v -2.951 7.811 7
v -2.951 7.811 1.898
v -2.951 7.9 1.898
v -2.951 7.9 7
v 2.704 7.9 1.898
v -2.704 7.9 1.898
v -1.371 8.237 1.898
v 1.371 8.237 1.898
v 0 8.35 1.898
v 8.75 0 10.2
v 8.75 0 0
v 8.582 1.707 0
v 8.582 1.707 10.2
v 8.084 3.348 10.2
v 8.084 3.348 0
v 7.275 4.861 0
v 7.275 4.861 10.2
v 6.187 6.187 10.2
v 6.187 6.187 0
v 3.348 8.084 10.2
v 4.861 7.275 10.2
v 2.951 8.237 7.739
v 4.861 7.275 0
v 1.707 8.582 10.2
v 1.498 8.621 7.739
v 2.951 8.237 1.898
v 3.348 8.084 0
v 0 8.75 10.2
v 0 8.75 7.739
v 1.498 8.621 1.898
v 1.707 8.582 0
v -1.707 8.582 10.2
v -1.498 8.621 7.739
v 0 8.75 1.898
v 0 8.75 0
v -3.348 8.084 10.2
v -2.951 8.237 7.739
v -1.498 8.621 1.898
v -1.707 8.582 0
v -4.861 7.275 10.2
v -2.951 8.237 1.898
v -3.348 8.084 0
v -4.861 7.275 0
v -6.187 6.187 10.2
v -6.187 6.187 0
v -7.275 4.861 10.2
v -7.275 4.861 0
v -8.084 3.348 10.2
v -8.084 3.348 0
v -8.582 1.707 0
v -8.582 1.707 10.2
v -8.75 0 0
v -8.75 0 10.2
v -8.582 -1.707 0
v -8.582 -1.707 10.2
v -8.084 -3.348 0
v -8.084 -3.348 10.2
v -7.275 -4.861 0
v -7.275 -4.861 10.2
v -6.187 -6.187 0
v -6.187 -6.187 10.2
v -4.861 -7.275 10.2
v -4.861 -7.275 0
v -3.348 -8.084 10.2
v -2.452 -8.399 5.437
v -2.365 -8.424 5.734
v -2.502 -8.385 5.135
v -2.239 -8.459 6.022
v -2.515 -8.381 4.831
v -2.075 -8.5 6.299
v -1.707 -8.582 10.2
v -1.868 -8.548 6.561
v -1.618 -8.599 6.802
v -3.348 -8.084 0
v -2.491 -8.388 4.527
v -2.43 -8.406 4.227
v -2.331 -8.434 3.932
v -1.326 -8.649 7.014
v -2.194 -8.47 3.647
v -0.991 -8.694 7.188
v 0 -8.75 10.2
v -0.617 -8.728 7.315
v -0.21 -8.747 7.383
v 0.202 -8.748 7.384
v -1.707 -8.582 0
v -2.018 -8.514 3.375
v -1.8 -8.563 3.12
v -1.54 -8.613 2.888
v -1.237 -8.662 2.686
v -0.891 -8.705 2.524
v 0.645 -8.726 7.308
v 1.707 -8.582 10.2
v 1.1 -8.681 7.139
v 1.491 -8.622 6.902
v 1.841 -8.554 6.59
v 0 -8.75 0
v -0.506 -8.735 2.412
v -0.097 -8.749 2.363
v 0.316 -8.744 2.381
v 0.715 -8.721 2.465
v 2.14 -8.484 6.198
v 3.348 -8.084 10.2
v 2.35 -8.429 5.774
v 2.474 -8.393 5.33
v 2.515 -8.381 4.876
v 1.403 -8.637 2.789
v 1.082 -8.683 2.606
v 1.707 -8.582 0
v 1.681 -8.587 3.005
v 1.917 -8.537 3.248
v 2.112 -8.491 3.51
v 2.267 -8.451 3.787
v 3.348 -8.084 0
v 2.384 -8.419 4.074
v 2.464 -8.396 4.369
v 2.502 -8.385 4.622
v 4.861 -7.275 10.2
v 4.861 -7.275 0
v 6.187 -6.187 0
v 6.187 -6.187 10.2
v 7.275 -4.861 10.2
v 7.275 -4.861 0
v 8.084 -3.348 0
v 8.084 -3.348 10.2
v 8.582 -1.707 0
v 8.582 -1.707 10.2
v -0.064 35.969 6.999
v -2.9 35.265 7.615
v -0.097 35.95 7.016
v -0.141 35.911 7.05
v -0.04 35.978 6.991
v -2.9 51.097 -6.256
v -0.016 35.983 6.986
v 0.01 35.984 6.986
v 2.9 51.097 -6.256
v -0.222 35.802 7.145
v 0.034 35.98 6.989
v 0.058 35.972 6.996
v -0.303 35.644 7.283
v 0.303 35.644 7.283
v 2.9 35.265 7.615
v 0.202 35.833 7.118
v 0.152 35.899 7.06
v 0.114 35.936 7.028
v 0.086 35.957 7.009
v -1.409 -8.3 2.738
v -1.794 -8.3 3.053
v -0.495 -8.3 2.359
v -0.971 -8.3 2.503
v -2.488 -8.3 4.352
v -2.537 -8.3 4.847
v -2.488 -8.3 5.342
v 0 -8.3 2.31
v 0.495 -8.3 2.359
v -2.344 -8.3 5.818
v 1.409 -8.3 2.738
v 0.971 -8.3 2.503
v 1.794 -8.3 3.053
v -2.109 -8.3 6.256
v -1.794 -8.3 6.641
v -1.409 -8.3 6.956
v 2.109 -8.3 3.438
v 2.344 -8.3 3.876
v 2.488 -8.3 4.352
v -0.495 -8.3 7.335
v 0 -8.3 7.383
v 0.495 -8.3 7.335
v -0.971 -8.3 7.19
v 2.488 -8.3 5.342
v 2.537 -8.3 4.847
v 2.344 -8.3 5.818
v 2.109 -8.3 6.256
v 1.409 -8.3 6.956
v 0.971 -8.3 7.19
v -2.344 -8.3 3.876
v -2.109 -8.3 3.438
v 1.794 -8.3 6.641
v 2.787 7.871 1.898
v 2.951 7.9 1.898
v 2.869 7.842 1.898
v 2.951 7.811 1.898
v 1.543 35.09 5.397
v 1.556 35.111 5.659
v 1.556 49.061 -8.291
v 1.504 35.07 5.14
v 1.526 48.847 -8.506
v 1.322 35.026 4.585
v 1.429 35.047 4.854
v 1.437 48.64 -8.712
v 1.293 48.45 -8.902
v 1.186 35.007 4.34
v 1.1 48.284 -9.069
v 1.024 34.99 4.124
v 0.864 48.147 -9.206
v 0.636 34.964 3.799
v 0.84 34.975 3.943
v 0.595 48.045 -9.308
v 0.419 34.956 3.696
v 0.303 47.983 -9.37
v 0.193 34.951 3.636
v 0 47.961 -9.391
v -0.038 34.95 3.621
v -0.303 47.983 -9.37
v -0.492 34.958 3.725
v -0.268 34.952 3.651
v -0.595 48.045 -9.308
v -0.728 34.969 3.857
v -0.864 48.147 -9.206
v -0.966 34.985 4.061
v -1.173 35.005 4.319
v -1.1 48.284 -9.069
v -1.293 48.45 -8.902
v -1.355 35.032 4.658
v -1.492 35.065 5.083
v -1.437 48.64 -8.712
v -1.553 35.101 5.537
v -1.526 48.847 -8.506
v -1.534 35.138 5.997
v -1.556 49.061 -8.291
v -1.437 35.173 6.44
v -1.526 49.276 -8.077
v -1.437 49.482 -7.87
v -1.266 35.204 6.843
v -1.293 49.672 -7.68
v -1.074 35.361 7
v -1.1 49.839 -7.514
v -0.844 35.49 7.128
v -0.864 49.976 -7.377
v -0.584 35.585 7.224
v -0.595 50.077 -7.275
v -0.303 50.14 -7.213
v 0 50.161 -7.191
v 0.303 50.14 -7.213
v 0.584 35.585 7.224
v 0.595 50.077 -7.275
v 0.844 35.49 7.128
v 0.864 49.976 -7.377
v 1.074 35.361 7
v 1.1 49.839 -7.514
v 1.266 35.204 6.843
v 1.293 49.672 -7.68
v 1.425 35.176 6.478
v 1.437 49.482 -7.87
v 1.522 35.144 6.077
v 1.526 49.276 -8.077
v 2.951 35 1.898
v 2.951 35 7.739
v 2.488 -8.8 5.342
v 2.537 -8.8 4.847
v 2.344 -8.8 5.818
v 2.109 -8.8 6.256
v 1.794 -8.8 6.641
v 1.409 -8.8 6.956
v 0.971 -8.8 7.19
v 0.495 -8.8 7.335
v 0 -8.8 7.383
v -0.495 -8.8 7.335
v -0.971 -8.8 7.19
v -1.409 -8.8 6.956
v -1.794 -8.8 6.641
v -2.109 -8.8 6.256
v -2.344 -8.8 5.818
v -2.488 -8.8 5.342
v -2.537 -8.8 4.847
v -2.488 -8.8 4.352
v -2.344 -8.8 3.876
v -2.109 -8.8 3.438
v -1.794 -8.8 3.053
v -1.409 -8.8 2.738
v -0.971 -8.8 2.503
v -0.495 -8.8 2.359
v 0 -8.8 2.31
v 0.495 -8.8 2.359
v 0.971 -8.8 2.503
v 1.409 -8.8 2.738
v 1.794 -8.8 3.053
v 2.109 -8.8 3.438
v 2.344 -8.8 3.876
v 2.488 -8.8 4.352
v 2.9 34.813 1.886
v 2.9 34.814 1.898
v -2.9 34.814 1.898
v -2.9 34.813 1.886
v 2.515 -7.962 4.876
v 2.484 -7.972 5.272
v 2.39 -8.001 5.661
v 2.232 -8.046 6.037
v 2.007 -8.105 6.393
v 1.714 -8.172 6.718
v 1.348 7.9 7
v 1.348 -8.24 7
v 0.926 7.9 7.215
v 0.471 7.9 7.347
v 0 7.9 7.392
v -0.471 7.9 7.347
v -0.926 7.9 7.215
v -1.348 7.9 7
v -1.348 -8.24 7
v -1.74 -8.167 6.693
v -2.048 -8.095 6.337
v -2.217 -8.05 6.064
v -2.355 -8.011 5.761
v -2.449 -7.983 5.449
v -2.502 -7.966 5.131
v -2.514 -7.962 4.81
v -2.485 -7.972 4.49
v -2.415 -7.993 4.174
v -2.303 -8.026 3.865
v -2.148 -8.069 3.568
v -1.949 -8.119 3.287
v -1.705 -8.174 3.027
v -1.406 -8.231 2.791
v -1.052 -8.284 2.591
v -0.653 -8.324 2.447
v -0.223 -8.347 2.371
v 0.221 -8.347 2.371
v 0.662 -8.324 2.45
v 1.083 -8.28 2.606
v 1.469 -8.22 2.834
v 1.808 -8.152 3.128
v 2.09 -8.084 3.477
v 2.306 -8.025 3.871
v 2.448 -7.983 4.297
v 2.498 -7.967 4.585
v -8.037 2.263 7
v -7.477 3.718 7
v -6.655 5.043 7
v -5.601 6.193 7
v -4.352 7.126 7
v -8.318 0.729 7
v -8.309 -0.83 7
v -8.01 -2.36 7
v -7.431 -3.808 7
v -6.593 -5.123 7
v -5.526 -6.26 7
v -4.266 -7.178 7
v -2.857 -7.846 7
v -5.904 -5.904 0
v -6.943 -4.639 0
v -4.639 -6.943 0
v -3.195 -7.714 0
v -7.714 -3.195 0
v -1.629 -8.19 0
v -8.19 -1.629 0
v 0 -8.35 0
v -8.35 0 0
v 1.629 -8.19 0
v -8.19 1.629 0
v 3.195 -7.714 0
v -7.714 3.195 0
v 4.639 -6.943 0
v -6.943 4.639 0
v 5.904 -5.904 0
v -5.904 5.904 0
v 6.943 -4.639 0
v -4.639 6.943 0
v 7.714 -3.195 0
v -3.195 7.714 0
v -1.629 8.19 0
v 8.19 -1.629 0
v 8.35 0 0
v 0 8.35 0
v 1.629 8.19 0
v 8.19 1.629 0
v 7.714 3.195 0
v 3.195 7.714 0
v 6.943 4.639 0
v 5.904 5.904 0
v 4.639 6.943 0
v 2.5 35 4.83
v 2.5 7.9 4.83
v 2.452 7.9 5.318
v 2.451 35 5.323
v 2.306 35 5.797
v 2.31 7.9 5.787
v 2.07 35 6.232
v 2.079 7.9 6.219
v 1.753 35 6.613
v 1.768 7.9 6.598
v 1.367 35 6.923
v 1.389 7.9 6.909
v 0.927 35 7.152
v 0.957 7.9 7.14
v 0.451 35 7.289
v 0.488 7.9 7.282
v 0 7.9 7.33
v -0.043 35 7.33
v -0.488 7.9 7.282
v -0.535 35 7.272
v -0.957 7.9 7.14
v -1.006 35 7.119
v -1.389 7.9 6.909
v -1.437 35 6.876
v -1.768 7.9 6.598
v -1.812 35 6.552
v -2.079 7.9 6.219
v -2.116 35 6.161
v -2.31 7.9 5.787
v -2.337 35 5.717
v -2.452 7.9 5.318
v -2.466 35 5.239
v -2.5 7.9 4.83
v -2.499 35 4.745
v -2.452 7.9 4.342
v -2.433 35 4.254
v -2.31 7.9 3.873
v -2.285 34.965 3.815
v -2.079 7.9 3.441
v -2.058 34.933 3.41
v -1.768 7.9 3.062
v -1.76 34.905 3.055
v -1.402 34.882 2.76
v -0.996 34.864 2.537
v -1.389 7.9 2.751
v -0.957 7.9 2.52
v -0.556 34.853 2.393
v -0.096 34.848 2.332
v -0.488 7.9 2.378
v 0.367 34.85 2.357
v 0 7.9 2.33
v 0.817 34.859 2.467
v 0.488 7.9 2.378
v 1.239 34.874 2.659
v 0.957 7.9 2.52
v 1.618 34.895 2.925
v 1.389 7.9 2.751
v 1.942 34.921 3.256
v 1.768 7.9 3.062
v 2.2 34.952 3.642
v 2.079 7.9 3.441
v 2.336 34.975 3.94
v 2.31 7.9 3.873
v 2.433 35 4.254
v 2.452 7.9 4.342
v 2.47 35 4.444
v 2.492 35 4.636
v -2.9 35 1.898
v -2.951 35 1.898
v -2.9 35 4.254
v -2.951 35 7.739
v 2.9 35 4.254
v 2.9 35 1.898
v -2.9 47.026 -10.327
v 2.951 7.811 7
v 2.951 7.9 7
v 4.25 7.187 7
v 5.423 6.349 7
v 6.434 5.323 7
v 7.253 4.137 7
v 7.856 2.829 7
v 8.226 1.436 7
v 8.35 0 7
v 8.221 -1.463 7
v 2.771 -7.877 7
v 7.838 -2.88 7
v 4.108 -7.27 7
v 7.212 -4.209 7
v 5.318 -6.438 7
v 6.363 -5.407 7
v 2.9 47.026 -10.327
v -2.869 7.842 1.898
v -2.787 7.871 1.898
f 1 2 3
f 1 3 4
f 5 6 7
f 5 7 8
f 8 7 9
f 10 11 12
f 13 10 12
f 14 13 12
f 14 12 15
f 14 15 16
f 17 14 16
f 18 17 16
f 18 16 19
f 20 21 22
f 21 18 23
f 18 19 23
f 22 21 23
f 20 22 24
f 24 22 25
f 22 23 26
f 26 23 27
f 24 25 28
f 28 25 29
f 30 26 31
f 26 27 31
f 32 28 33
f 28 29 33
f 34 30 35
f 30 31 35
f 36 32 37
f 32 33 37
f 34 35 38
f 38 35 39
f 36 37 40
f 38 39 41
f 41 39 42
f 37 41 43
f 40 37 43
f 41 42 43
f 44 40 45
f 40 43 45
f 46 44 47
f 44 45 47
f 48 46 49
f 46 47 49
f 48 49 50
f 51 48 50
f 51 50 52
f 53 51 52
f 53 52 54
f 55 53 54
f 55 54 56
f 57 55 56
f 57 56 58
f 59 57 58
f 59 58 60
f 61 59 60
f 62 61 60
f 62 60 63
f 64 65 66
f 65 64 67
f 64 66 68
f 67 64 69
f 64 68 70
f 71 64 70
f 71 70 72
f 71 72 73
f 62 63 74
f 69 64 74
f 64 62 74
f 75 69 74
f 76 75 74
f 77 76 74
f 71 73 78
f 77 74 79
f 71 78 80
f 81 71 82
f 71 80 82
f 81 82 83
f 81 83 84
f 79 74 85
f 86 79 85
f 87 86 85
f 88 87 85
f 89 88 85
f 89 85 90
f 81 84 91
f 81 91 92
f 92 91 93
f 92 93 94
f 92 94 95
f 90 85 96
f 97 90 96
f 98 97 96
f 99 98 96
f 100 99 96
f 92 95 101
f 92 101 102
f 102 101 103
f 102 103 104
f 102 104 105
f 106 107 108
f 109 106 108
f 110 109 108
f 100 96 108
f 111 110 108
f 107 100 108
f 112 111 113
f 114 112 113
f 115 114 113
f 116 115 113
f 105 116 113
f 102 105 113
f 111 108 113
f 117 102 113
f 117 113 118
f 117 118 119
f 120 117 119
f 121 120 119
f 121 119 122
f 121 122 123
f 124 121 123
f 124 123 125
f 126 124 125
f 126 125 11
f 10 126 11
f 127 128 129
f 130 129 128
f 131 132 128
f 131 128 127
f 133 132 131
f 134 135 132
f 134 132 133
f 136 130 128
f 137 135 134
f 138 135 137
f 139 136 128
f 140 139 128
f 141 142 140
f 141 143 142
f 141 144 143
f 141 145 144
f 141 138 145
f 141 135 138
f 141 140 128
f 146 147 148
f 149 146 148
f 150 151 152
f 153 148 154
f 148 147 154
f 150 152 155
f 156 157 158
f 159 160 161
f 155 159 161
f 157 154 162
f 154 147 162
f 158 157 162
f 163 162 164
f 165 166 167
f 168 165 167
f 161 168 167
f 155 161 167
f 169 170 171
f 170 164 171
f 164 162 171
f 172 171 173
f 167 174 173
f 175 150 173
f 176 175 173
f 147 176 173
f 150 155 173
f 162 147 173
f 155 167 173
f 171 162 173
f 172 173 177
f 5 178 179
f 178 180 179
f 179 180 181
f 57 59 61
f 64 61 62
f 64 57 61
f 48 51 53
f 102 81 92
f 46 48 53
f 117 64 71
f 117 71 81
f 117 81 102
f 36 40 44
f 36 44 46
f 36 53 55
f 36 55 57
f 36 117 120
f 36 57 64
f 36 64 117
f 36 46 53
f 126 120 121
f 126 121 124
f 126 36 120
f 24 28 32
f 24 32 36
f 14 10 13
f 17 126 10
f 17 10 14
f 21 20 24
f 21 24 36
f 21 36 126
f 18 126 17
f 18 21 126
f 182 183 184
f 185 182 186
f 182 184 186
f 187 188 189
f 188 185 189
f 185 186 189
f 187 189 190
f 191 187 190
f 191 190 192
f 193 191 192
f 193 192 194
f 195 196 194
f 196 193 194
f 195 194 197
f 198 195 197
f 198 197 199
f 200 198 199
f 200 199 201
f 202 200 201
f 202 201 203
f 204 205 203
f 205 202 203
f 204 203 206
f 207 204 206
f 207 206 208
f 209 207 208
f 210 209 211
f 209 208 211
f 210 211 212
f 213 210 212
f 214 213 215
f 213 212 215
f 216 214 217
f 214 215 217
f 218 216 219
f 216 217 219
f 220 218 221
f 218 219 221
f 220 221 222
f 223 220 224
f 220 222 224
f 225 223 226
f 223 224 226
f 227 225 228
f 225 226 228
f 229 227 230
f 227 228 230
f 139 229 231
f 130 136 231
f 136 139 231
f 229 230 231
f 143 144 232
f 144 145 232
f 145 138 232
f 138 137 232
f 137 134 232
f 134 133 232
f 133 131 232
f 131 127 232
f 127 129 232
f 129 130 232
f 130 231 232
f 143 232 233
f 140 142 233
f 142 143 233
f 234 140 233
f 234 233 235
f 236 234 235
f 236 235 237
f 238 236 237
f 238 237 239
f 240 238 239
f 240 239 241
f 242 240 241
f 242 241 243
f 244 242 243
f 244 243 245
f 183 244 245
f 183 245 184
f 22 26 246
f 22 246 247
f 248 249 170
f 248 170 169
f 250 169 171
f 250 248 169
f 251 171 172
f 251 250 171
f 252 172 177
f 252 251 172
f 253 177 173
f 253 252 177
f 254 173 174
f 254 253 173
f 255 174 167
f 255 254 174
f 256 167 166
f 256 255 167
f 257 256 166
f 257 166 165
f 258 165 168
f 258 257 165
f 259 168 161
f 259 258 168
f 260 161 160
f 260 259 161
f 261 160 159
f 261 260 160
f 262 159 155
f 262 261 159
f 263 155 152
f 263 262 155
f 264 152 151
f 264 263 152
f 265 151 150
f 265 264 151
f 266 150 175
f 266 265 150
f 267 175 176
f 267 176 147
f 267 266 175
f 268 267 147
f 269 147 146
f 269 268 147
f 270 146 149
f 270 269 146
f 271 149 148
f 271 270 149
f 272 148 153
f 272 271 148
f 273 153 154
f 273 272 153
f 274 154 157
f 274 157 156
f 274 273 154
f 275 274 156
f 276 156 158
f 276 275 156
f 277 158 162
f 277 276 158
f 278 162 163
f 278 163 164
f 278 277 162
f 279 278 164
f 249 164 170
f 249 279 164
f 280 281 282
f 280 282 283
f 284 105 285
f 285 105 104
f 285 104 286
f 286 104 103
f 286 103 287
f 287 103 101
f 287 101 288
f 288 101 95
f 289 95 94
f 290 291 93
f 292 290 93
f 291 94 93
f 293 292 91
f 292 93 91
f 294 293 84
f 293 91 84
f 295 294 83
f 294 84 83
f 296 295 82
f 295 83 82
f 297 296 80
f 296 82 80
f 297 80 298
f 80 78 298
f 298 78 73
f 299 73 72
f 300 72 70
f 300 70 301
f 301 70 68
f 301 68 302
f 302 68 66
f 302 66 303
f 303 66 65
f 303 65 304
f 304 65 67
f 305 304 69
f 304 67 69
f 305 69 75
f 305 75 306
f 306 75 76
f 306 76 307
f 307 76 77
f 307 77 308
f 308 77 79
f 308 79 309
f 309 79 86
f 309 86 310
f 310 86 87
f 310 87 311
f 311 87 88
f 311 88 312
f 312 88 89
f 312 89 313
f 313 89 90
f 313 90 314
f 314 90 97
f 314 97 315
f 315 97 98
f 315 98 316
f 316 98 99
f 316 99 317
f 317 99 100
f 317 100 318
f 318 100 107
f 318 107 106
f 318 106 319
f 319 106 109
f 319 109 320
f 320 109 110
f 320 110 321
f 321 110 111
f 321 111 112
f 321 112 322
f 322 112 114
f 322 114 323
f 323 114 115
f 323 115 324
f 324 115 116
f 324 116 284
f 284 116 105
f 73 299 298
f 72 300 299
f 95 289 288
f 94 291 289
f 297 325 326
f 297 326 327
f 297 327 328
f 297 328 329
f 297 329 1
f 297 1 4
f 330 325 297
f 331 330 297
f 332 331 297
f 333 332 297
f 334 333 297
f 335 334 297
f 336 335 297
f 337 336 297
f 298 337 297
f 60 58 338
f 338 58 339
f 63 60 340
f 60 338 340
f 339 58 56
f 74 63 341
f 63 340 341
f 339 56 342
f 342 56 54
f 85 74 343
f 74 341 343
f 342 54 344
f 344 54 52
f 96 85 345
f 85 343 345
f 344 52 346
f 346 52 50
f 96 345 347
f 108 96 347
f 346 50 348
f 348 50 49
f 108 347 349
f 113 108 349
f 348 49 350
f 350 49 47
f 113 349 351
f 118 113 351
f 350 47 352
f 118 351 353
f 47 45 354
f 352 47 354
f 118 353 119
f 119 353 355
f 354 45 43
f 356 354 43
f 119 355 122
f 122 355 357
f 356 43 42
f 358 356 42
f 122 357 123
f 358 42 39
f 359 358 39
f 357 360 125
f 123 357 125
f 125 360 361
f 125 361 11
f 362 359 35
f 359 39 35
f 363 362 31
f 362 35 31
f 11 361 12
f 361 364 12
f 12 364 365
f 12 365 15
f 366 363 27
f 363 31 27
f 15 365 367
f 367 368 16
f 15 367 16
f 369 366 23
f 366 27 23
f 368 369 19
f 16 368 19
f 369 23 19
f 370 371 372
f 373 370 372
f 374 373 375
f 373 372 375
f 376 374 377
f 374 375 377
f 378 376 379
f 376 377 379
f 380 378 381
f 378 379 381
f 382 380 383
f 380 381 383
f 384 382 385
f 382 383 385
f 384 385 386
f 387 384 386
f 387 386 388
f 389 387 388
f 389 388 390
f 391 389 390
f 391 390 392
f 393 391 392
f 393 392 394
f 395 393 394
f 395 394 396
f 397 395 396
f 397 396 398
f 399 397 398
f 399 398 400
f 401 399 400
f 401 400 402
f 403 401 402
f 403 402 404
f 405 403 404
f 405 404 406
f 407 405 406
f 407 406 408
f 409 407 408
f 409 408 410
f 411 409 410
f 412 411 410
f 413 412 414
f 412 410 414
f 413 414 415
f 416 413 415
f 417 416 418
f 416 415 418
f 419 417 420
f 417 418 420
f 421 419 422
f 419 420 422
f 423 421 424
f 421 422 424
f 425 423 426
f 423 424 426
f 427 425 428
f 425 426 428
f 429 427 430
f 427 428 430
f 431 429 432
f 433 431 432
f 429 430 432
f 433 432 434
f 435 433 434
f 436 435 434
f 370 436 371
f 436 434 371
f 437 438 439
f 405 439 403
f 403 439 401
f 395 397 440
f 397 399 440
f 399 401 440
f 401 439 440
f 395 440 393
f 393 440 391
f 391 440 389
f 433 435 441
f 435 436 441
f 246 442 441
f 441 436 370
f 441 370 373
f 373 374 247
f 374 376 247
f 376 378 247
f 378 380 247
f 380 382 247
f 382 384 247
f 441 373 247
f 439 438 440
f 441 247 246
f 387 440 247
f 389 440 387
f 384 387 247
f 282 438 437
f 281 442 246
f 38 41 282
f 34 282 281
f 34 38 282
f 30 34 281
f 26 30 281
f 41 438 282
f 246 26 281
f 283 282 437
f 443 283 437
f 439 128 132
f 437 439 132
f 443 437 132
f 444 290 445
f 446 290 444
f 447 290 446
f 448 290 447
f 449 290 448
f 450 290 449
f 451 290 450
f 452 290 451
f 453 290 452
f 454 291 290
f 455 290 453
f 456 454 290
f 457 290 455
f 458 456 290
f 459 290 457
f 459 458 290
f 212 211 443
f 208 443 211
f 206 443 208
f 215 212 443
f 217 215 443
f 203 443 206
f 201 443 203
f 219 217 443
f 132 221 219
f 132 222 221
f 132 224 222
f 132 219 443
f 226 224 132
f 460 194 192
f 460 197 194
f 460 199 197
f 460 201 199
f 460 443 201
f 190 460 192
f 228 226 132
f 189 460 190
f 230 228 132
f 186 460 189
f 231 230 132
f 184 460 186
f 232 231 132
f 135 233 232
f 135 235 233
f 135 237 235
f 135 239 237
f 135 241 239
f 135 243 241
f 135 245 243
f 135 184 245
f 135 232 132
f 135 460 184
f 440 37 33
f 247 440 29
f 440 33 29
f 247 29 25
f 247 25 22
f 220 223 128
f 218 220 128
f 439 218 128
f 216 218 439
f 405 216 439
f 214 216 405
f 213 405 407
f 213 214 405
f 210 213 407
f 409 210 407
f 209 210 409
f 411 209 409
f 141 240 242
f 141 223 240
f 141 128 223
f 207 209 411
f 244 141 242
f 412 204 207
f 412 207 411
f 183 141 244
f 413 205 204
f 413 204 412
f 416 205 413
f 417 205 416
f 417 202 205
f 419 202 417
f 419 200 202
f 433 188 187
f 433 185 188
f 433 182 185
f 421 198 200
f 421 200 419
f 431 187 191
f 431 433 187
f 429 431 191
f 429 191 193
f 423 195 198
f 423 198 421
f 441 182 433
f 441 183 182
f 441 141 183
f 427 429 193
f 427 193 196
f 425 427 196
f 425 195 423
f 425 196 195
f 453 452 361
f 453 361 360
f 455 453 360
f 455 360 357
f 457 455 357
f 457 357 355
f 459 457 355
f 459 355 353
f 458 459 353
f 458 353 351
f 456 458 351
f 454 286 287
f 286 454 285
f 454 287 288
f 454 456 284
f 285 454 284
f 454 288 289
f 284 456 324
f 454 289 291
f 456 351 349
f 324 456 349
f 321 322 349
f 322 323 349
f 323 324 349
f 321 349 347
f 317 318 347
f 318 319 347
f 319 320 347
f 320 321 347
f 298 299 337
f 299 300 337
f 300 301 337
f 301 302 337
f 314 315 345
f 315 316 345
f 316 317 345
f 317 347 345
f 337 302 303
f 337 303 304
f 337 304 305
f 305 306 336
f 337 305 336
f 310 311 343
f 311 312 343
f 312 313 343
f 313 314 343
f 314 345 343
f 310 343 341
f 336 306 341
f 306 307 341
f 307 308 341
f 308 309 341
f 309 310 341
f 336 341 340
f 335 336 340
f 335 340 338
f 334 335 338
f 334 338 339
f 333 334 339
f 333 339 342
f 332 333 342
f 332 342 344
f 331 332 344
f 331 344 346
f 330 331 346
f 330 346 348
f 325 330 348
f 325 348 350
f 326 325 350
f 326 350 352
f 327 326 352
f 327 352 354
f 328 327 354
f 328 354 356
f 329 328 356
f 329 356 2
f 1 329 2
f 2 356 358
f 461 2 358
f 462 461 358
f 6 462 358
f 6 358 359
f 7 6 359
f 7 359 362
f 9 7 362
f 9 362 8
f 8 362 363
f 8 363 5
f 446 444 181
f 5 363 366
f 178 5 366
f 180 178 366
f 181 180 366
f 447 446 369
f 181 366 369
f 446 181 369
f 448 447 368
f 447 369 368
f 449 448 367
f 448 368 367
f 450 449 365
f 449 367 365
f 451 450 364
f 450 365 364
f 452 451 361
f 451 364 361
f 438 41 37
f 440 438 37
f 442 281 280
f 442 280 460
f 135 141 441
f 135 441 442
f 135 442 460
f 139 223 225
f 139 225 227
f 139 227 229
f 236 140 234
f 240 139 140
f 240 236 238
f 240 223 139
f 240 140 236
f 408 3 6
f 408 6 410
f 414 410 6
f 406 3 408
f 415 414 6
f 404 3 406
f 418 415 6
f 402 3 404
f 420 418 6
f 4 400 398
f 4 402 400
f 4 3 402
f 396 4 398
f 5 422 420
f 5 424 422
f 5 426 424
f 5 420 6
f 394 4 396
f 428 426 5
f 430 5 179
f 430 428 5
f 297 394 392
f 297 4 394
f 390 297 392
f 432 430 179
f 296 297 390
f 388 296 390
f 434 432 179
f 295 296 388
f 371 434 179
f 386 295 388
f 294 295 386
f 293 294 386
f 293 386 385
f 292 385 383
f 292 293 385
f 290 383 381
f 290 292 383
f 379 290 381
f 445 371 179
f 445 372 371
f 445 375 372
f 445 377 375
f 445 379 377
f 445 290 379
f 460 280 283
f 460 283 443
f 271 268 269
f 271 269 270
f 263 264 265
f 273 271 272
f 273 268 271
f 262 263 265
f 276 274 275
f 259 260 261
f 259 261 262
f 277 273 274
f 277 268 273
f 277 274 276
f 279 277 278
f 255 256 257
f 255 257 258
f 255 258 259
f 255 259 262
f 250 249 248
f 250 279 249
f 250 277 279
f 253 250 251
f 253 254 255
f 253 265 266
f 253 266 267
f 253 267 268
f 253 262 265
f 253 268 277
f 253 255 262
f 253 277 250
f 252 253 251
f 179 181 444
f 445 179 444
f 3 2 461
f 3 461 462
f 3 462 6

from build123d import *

# Parameters (mm, degrees)
F0_R      = 8.75
F1_DEPTH  = 10.2
F3_R      = 2.5153510356
F4_DEPTH  = 9.4
F5_R      = 8.35
F6_DEPTH  = 7
F8_R      = 2.5366513064
F9_DEPTH  = 0.5
F10_W     = 5.9026055969
F10_H     = 5.841257982
F11_DEPTH = 35
F2_R      = 2.5
F12_DEPTH = 35
F13_DEPTH = 7.9
F15_DEPTH = 2.9
F16_R     = 1.555514707
F17_DEPTH = 20.5


with BuildPart() as f1:
    # F0 (on Top) → F1 (new body)
    with BuildSketch(Plane.XY):
        Circle(F0_R)
    extrude(amount=F1_DEPTH)

    # F3 (on Front) → F4 (cut, symmetric)
    with BuildSketch(Plane.XZ):
        with Locations((0, 4.8764166422)):
            Circle(F3_R)
    extrude(amount=F4_DEPTH, both=True, mode=Mode.SUBTRACT)

    # F5 (on face) → F6 (cut)
    with BuildSketch(Plane(origin=(0, 0, 0), x_dir=(1, 0, 0), z_dir=(0, 0, -1))):
        Circle(F5_R)
    extrude(amount=-F6_DEPTH, mode=Mode.SUBTRACT)

    # F10 (on Front) → F11 (join)
    with BuildSketch(Plane.XZ):
        with Locations((0, 4.8186485656)):
            Rectangle(F10_W, F10_H)
    extrude(amount=-F11_DEPTH)

    # F2 (on Front) → F12 (cut)
    with BuildSketch(Plane.XZ):
        with Locations((0, 4.83)):
            Circle(F2_R)
    extrude(amount=-F12_DEPTH, mode=Mode.SUBTRACT)

    # F13 (cut): a face of the model
    f13_faces = [f1.faces().sort_by_distance(p)[0] for p in [
        (0, 0, 1.9786558078),
    ]]
    extrude(f13_faces, amount=-F13_DEPTH, mode=Mode.SUBTRACT)

    # F14 (on Right) → F15 (join, symmetric)
    with BuildSketch(Plane.YZ):
        Polygon((35.2653861046, 7.6153781265), (34.8130613565, 1.8859326374), (47.0258258283, -10.3268325329), (51.0967484399, -6.2559101541), align=None)
    extrude(amount=F15_DEPTH, both=True)

    # F16 (on face) → F17 (cut)
    with BuildSketch(Plane(origin=(0, 28.6763278358, -28.6763294759), x_dir=(1, 0, 0), z_dir=(0, 0.707106761, -0.7071068014))):
        with Locations((0, -28.8286850837)):
            Circle(F16_R)
    extrude(amount=-F17_DEPTH, mode=Mode.SUBTRACT)


with BuildPart() as f9:
    # F8 (on offset) → F9 (new body)
    with BuildSketch(Plane.XZ.offset(8.8)):
        with Locations((0, 4.8468452878)):
            Circle(F8_R)
    extrude(amount=-F9_DEPTH)


solid = Compound([f1.part, f9.part])
